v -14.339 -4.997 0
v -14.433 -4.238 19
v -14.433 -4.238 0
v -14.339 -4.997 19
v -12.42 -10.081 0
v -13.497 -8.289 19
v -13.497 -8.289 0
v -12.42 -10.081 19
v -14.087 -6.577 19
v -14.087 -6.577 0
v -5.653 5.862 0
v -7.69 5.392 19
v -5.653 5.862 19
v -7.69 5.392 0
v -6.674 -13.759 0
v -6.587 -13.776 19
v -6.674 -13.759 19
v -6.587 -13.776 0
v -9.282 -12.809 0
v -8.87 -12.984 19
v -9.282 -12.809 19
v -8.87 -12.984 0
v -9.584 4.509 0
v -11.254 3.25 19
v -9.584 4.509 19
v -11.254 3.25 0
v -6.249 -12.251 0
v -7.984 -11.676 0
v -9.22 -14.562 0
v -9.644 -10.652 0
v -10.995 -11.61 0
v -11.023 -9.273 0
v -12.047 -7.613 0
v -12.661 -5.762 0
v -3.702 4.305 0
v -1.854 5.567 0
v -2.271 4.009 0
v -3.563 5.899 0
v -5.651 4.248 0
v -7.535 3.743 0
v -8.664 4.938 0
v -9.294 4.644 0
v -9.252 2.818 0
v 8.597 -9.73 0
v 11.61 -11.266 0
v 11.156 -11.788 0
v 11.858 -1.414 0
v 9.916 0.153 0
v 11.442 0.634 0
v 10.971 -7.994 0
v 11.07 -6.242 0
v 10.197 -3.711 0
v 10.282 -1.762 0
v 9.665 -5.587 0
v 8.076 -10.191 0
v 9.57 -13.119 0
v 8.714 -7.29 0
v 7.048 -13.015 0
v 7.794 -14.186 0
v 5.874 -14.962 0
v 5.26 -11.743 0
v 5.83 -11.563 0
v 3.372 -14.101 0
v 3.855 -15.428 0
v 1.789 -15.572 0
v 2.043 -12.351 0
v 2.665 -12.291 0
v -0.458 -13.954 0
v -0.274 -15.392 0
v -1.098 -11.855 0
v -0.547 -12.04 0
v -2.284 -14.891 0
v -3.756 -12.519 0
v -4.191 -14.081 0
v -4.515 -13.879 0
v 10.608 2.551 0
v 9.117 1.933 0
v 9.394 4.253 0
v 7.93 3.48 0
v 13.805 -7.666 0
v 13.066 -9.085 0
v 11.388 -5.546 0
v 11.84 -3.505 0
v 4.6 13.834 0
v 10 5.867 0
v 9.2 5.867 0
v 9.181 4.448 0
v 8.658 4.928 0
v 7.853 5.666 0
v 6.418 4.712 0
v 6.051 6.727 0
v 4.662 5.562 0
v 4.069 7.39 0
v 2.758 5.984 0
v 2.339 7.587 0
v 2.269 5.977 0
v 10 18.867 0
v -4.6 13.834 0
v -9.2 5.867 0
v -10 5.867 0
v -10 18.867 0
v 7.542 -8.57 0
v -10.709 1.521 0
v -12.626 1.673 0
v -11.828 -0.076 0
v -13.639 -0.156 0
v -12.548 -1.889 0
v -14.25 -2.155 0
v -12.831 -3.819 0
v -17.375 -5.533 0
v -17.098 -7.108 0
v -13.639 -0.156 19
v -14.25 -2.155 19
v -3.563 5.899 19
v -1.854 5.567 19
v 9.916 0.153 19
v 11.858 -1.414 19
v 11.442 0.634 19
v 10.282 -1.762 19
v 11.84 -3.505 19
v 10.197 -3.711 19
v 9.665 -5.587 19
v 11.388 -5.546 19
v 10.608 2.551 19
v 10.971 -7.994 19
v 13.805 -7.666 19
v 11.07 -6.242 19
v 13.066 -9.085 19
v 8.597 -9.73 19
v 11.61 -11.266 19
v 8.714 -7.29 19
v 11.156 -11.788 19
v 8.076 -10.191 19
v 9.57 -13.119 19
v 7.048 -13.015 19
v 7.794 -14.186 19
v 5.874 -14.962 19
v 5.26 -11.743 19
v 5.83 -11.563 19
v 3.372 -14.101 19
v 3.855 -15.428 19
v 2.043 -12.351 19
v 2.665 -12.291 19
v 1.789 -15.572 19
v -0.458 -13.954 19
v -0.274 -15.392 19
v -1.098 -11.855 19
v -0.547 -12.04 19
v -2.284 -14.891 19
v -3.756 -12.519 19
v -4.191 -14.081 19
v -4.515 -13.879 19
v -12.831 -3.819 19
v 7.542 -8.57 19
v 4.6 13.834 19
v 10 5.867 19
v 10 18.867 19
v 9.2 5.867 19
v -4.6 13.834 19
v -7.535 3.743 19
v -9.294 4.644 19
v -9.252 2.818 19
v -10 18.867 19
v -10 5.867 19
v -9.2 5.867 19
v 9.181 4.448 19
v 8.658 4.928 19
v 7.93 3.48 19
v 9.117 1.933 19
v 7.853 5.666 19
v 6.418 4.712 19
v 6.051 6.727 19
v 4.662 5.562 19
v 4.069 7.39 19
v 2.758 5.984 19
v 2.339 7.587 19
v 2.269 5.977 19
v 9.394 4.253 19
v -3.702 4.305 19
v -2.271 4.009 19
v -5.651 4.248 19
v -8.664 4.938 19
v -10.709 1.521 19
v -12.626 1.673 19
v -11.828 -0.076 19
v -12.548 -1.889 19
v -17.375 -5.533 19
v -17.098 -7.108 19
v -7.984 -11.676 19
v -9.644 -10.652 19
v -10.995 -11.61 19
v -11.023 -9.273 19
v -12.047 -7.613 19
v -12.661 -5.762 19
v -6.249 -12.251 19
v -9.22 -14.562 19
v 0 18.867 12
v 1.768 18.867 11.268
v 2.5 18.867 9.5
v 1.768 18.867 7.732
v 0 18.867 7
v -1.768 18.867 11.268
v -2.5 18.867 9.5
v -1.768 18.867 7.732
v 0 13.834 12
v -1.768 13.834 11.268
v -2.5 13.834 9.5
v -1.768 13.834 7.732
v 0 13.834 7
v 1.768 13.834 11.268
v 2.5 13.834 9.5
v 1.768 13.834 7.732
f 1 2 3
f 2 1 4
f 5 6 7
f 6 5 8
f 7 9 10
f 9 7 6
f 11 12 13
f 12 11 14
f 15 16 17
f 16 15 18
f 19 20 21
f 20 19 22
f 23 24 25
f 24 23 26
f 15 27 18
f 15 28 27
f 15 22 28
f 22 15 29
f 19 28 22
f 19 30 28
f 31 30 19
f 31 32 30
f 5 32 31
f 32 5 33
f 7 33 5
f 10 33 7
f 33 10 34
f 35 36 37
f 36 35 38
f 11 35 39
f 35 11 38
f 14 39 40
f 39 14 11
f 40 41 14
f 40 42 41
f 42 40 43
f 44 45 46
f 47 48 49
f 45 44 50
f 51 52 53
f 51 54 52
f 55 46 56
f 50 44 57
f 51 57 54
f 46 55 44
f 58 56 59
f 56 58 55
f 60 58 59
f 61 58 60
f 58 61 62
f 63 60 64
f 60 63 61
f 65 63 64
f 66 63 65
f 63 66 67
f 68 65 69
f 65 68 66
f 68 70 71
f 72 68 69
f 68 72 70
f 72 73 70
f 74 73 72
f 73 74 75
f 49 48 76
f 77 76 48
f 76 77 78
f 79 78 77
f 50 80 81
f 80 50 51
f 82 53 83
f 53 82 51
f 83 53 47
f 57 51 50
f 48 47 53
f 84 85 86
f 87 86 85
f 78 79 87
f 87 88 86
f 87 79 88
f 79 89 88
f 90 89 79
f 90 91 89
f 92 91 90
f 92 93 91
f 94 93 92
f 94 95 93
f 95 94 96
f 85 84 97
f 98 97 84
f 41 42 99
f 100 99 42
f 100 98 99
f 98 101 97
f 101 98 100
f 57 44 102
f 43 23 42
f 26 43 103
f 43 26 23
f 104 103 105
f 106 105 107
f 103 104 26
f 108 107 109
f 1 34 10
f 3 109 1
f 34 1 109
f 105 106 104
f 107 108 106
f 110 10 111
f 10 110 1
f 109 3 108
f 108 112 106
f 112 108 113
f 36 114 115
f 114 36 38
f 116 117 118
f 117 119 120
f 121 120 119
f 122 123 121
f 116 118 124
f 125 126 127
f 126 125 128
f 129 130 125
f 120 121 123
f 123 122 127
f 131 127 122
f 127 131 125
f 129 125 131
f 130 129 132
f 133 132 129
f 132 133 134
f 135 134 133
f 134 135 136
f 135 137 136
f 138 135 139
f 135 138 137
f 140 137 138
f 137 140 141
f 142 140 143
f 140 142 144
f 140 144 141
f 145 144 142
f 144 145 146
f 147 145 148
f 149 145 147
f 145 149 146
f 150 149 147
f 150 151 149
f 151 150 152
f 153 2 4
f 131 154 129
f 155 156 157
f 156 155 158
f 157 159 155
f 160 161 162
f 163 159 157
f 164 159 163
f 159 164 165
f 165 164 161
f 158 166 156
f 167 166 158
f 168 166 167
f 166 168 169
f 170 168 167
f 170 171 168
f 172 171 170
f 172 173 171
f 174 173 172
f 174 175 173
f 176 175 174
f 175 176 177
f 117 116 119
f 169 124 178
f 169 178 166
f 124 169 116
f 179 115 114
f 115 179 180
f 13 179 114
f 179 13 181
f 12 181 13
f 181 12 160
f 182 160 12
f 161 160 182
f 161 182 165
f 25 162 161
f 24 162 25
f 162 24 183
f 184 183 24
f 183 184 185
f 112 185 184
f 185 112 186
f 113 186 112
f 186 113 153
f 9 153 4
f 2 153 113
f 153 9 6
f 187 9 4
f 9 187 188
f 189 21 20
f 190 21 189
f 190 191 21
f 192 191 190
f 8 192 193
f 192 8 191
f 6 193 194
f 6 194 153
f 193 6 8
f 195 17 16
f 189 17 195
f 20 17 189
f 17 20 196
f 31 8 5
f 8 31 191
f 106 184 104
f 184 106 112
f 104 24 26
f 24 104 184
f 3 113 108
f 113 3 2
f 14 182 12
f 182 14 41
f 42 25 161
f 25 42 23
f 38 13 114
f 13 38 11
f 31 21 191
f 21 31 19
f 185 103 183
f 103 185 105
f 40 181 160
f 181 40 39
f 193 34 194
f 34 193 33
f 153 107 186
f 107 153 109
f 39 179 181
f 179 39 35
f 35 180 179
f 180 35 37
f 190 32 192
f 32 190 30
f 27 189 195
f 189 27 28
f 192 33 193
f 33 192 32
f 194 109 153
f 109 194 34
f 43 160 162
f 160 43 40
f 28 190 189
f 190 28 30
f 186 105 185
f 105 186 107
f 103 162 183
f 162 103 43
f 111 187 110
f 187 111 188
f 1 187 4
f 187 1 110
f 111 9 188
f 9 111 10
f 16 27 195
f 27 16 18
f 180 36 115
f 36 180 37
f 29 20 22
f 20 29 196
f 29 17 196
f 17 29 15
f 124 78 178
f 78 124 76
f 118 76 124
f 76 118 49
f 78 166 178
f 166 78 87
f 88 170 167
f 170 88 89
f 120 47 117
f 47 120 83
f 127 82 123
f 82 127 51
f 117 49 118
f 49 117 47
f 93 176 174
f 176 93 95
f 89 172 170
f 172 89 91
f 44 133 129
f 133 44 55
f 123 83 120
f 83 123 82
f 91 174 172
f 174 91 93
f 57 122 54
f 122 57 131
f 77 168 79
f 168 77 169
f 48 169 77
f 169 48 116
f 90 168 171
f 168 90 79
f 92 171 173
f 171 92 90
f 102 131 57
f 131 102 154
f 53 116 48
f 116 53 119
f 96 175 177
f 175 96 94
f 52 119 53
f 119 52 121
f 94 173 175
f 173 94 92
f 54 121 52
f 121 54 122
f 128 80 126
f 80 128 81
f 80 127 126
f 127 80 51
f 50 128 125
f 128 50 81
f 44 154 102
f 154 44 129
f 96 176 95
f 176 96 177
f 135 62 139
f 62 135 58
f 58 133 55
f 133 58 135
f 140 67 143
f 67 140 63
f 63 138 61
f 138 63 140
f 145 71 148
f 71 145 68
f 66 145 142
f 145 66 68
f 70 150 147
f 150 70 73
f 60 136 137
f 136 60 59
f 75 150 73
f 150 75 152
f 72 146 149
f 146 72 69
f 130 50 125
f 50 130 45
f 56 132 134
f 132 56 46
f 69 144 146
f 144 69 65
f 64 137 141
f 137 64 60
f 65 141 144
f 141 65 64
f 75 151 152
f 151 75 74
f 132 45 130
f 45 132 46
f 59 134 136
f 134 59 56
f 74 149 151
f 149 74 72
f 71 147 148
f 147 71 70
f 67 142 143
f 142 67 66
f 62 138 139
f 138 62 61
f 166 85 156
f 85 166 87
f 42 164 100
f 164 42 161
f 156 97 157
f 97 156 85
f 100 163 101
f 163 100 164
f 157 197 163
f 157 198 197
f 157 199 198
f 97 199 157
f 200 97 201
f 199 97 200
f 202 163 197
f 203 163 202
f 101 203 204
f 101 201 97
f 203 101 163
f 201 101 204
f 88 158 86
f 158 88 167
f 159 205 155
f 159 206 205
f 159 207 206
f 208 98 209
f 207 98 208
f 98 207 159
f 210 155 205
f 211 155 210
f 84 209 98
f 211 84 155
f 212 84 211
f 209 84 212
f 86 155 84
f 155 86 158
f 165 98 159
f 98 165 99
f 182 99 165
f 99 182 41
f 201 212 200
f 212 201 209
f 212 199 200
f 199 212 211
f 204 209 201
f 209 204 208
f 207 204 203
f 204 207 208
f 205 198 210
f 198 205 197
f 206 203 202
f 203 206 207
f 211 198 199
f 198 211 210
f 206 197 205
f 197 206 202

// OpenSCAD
// External diameter of clip
cableD=20;
// wall thickness
wall=1.6;
// height of clip
height=19;
// extra material on the bottom of the base
baseExtra=3;
// diameter of the hole in the base, 0 to disable
hole=5;
// ratio of displacement of clip, closer to 1 makes for longer arms
clip_baseRatio=1/3;
// angle of clip holders on the top
topAngle=45;
// angle of the bottom opening of the clip
bottomAngle=40;
// pretensile angle of the clip
openAngle= 35;
// number of female hooks (>1)
Nhooks=3;
// tolerance for hooks
tolerance=0.4;

module base(){
    width=cableD;
    baseH=width/2+baseExtra;
    difference(){
        union(){
            cylinder(d=width,h=height,$fn=6);
            translate([-width/2,0,0]) cube([width,baseH,height]);
        }
        translate([0,0,-1])scale([1,1,2]) {
            cylinder(d=width-wall*1,h=height,$fn=6);
            translate([0,-cableD*clip_baseRatio,0]) cylinder(d=cableD,h=height);
        }
        translate([0,0,height/2]) rotate([-90,0,0])
            cylinder(d=hole,h=baseH+wall);
            
    }
}

//base();

module sector(radius, angles, fn = 24) {
    r = radius / cos(180 / fn);
    step = -360 / fn;

    points = concat([[0, 0]],
        [for(a = [angles[0] : step : angles[1] - 360]) 
            [r * cos(a), r * sin(a)]
        ],
        [[r * cos(angles[1]), r * sin(angles[1])]]
    );

    difference() {
        circle(radius, $fn = fn);
        polygon(points);
    }
}


//!linear_extrude(height) sector (cableD/2,[60,120]);

module clipbase(d,h,w,a){
    difference(){
        cylinder(d=d,h=h);
        translate([0,0,-1])
            cylinder(d=d-w*2,h=h+2);
//        translate([-(hole+w*2)/2,0,-1]) cube([hole+w*2,d+w,h+2]);
    }
    for (r=a*[-1,1])
        rotate([0,0,-90+r])
            translate([d/2-0.2,-w/2,0]) cube([2*w,w,h]);
}
//translate([0,-cableD*clip_baseRatio,0])
//clipbase(cableD,height,wall,topAngle);

module Mclip(){
    difference(){
        clipbase(cableD,height,wall,topAngle);
        translate([0,0,-1])linear_extrude(height+2) 
            sector (cableD/2+3*wall,[90+bottomAngle/2, -90+topAngle/2, ]);
    }
    rotate([0,0,+topAngle/2])translate([-wall,-cableD/2+0.1,0]) cylinder(d=wall*2,h=height,$fn=3);
}

module Fclip(){
    dd=tolerance;
    n=Nhooks;
    anglediff=asin((4*wall)/cableD);
    intersection(){
        clipbase(cableD,height,wall,topAngle);
        translate([0,0,-1])linear_extrude(height+2) 
            sector (cableD/2+3*wall,[90-bottomAngle/2, -90+topAngle/2+2*asin(dd/cableD), ]);
    }
    difference(){
        hull(){
        linear_extrude(height) 
            sector (cableD/2+2*wall,[-90+topAngle*2/3, -90-(n-0.5)*anglediff, ],40);
            linear_extrude(height) 
            sector (cableD/2,[-90+topAngle, -90-(n-0.5)*anglediff, ],40);
        }
        translate([0,0,-1])cylinder(d=cableD,h=height+2);
        for (i=[0:n])
        rotate([0,0,+topAngle/2-i*anglediff])translate([-wall-dd,-cableD/2+0.1,-1]) cylinder(d=wall*2+dd,h=height+2,$fn=3);
    }
}

module transrot(trans,rot){
    translate(trans) 
    rotate(rot) 
    translate(-trans) 
    children();
}
//translate([-(cableD/2)*sin(60),(cableD/2)*cos(60),0]) cylinder(d=0.11,h=20);

transrot([-(cableD/2)*sin(60),(cableD/2)*cos(60),0],[0,0,-openAngle]) 
    Mclip();
transrot([(cableD/2)*sin(60),(cableD/2)*cos(60),0],[0,0,openAngle/2]) 
    Fclip();
translate([0,cableD*clip_baseRatio-wall/2,0])
base();
